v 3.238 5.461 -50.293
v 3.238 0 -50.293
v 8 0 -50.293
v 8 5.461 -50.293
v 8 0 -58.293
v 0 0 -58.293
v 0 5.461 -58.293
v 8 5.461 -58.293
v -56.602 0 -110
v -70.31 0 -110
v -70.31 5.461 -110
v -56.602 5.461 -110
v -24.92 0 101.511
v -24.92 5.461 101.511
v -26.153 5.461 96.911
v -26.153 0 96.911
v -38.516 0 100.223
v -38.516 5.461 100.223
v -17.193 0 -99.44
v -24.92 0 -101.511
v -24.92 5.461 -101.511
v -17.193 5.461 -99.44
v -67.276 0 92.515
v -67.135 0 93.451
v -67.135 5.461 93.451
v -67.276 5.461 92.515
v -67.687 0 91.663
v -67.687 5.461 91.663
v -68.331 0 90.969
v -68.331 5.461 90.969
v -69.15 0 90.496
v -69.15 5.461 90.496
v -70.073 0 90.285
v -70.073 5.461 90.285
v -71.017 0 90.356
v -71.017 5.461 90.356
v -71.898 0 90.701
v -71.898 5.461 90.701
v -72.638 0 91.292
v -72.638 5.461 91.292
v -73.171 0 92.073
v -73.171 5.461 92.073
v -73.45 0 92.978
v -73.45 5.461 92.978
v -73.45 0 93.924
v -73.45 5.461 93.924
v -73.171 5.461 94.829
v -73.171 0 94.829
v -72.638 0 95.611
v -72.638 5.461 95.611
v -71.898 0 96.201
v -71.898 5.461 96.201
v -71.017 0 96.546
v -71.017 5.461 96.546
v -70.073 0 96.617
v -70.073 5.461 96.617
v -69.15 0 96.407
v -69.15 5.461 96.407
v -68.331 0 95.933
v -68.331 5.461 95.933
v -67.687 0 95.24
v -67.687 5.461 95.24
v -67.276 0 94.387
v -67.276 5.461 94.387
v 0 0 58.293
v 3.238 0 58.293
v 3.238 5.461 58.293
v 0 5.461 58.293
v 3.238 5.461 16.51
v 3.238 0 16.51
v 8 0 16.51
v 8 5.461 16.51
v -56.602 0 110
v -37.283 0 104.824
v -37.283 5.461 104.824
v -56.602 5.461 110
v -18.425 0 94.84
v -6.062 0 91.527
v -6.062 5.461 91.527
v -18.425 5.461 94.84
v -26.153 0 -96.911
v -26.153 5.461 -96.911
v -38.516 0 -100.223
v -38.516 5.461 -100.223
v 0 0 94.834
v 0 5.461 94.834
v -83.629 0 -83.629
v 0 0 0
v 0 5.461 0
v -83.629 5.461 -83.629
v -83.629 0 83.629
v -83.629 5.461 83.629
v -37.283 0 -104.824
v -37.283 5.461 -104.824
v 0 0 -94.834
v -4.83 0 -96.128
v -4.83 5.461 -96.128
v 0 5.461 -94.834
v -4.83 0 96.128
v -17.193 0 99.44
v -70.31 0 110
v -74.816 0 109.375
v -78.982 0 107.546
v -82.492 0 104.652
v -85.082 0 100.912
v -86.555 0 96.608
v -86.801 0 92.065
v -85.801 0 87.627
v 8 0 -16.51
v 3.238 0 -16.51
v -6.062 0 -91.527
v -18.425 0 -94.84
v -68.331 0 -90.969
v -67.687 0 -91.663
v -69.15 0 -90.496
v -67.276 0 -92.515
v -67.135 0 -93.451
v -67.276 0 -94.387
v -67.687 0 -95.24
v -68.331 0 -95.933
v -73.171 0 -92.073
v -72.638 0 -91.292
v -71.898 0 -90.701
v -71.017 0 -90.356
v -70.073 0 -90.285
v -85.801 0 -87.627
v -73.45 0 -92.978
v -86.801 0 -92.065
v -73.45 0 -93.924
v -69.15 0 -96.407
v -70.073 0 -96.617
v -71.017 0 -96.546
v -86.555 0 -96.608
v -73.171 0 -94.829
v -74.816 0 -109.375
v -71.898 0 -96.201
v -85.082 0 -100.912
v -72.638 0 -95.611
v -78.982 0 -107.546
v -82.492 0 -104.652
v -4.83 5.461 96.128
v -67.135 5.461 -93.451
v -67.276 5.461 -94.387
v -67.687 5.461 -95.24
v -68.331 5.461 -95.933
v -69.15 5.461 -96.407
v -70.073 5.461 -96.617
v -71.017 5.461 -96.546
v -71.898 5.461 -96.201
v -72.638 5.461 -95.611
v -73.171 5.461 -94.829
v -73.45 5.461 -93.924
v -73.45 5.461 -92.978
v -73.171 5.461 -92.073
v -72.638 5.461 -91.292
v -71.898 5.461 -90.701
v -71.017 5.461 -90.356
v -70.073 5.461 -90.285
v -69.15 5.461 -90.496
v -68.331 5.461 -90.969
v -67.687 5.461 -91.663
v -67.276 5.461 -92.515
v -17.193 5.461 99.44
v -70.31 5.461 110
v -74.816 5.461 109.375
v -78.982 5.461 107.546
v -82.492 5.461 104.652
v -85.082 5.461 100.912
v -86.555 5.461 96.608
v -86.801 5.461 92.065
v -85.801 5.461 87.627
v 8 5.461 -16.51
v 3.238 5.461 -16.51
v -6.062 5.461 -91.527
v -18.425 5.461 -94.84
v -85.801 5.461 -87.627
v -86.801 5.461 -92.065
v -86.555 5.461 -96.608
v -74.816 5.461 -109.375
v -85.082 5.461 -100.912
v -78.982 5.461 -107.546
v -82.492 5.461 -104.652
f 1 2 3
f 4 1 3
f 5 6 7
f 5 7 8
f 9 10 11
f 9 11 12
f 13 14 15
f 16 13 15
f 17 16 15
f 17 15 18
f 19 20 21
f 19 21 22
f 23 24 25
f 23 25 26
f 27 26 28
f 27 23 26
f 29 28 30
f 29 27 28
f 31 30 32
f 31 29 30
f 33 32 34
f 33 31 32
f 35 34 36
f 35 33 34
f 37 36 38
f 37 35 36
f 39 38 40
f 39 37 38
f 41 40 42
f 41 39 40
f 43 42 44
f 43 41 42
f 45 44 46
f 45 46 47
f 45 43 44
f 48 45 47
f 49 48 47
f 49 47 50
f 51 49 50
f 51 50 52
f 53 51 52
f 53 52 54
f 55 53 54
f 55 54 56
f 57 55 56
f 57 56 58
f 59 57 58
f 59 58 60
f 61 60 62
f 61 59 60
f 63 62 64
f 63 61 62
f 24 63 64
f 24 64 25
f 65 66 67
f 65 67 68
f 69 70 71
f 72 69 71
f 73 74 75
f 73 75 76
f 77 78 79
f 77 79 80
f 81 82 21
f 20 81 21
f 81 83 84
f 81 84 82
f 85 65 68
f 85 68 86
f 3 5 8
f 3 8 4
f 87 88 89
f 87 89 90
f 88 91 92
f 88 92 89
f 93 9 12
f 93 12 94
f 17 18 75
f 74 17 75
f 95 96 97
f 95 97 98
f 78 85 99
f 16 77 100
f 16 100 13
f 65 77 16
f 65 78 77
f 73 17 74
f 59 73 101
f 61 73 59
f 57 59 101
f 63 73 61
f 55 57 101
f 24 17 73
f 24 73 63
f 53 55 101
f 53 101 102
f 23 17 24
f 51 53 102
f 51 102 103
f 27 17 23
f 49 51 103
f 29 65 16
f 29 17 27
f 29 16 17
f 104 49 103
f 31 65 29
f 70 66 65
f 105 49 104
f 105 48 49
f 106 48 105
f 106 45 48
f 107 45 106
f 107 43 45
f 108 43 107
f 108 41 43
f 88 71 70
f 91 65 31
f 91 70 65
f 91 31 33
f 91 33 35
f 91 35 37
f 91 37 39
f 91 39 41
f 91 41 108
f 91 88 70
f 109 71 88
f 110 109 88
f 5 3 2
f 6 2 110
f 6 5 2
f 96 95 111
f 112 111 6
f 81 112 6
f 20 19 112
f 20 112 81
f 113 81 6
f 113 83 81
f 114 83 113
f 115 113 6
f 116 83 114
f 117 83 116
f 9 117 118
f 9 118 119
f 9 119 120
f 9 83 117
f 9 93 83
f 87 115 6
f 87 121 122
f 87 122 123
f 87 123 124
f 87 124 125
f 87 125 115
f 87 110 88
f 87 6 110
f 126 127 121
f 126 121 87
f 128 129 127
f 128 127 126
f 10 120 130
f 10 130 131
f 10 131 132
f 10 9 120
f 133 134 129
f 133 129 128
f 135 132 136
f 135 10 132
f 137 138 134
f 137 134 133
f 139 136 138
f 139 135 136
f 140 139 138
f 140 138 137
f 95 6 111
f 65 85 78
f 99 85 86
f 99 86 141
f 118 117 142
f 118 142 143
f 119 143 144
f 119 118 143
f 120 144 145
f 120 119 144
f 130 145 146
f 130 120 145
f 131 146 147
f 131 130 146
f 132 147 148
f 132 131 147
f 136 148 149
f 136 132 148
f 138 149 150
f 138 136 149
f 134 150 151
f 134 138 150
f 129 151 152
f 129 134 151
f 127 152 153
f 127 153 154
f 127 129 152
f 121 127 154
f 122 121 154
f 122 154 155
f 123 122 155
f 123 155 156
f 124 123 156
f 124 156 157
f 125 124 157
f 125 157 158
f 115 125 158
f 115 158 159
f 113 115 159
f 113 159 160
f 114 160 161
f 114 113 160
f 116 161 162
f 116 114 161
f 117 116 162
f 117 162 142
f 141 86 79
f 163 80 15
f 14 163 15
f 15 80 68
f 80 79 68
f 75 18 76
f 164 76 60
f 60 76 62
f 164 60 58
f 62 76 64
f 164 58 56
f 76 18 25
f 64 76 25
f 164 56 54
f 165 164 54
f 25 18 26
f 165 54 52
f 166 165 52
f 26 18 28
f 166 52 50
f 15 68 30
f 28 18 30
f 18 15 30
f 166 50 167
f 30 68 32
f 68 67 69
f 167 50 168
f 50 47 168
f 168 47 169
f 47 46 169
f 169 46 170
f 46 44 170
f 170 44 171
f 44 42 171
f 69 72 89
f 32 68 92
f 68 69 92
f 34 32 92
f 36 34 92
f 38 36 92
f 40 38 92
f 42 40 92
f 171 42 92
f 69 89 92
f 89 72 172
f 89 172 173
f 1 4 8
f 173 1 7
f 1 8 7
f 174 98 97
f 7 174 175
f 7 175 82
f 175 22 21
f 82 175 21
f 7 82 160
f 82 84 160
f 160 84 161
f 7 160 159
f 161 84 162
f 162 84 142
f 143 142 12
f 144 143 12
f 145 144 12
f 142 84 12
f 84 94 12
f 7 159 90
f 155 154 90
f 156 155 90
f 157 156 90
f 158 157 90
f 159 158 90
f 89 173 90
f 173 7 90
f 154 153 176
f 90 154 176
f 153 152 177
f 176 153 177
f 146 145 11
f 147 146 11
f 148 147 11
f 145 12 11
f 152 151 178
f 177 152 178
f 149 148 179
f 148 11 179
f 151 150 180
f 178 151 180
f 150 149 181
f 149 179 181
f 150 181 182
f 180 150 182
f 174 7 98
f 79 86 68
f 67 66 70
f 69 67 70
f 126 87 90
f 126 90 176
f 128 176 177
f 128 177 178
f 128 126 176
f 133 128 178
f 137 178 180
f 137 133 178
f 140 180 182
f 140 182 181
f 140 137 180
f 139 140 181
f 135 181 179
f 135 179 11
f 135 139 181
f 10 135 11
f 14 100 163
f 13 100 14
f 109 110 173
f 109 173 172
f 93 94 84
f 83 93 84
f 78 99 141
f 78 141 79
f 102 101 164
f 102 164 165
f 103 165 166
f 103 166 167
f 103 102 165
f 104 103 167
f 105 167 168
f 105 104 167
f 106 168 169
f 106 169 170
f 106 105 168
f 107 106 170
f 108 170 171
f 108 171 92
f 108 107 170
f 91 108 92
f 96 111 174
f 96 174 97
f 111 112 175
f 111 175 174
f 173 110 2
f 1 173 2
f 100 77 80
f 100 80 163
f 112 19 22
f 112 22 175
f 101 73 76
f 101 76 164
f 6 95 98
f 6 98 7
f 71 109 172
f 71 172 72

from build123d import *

# Parameters (mm, degrees)
SKETCH1_R           = 3.175
BOSS_EXTRUDE1_DEPTH = 5.461
SKETCH3_W           = 4.7625
SKETCH3_H           = 33.783
SKETCH3_H_2         = 46.289475607
CUT_EXTRUDE2_DEPTH  = 10


with BuildPart() as part:
    # Sketch1 → Boss-Extrude1 (new body)
    with BuildSketch(Plane(origin=(0, 0, 0), x_dir=(1, 0, 0), z_dir=(0, 1, 0))):
        with BuildLine():
            Line((0, 0), (-83.629476528, 83.629476528))
            ThreePointArc((-83.629476528, 83.629476528), (-85.081850373, 100.91197572), (-70.310188895, 110))
            Line((-70.310188895, 110), (-56.601944845, 110))
            Line((-56.601944845, 110), (0, 94.833554589))
            Line((0, 94.833554589), (0, 58.293))
            Line((0, 58.293), (8, 58.293))
            Line((8, 58.293), (8, -58.293))
            Line((8, -58.293), (0, -58.293))
            Line((0, -58.293), (0, -94.833554589))
            Line((0, -94.833554589), (-56.601944845, -110))
            Line((-56.601944845, -110), (-70.310188895, -110))
            ThreePointArc((-70.310188895, -110), (-85.081850373, -100.91197572), (-83.629476528, -83.629476528))
            Line((-83.629476528, -83.629476528), (0, 0))
        make_face()
        with Locations((-70.310188895, 93.451069294)):
            Circle(SKETCH1_R, mode=Mode.SUBTRACT)
        with Locations((-70.310188895, -93.451069294)):
            Circle(SKETCH1_R, mode=Mode.SUBTRACT)
    extrude(amount=BOSS_EXTRUDE1_DEPTH)

    # Sketch3 → Cut-Extrude2 (cut)
    with BuildSketch(Plane(origin=(0, 0, 0), x_dir=(1, 0, 0), z_dir=(0, 1, 0))):
        Polygon((-4.829629131, 96.127649814), (-17.19282542, 99.440358276), (-18.425451123, 94.840136528), (-6.062254834, 91.527428067), align=None)
        Polygon((-24.920232031, 101.510910637), (-37.283428319, 104.823619098), (-38.516054022, 100.22339735), (-26.152857733, 96.910688889), align=None)
        with Locations((5.61875, 33.4015)):
            Rectangle(SKETCH3_W, SKETCH3_H)
        Polygon((-26.152857733, -96.910688889), (-38.516054022, -100.22339735), (-37.283428319, -104.823619098), (-24.920232031, -101.510910637), align=None)
        Polygon((-6.062254834, -91.527428067), (-18.425451123, -94.840136528), (-17.19282542, -99.440358276), (-4.829629131, -96.127649814), align=None)
        with Locations((5.61875, -39.654737804)):
            Rectangle(SKETCH3_W, SKETCH3_H_2)
    extrude(amount=CUT_EXTRUDE2_DEPTH, mode=Mode.SUBTRACT)


solid = part.part
